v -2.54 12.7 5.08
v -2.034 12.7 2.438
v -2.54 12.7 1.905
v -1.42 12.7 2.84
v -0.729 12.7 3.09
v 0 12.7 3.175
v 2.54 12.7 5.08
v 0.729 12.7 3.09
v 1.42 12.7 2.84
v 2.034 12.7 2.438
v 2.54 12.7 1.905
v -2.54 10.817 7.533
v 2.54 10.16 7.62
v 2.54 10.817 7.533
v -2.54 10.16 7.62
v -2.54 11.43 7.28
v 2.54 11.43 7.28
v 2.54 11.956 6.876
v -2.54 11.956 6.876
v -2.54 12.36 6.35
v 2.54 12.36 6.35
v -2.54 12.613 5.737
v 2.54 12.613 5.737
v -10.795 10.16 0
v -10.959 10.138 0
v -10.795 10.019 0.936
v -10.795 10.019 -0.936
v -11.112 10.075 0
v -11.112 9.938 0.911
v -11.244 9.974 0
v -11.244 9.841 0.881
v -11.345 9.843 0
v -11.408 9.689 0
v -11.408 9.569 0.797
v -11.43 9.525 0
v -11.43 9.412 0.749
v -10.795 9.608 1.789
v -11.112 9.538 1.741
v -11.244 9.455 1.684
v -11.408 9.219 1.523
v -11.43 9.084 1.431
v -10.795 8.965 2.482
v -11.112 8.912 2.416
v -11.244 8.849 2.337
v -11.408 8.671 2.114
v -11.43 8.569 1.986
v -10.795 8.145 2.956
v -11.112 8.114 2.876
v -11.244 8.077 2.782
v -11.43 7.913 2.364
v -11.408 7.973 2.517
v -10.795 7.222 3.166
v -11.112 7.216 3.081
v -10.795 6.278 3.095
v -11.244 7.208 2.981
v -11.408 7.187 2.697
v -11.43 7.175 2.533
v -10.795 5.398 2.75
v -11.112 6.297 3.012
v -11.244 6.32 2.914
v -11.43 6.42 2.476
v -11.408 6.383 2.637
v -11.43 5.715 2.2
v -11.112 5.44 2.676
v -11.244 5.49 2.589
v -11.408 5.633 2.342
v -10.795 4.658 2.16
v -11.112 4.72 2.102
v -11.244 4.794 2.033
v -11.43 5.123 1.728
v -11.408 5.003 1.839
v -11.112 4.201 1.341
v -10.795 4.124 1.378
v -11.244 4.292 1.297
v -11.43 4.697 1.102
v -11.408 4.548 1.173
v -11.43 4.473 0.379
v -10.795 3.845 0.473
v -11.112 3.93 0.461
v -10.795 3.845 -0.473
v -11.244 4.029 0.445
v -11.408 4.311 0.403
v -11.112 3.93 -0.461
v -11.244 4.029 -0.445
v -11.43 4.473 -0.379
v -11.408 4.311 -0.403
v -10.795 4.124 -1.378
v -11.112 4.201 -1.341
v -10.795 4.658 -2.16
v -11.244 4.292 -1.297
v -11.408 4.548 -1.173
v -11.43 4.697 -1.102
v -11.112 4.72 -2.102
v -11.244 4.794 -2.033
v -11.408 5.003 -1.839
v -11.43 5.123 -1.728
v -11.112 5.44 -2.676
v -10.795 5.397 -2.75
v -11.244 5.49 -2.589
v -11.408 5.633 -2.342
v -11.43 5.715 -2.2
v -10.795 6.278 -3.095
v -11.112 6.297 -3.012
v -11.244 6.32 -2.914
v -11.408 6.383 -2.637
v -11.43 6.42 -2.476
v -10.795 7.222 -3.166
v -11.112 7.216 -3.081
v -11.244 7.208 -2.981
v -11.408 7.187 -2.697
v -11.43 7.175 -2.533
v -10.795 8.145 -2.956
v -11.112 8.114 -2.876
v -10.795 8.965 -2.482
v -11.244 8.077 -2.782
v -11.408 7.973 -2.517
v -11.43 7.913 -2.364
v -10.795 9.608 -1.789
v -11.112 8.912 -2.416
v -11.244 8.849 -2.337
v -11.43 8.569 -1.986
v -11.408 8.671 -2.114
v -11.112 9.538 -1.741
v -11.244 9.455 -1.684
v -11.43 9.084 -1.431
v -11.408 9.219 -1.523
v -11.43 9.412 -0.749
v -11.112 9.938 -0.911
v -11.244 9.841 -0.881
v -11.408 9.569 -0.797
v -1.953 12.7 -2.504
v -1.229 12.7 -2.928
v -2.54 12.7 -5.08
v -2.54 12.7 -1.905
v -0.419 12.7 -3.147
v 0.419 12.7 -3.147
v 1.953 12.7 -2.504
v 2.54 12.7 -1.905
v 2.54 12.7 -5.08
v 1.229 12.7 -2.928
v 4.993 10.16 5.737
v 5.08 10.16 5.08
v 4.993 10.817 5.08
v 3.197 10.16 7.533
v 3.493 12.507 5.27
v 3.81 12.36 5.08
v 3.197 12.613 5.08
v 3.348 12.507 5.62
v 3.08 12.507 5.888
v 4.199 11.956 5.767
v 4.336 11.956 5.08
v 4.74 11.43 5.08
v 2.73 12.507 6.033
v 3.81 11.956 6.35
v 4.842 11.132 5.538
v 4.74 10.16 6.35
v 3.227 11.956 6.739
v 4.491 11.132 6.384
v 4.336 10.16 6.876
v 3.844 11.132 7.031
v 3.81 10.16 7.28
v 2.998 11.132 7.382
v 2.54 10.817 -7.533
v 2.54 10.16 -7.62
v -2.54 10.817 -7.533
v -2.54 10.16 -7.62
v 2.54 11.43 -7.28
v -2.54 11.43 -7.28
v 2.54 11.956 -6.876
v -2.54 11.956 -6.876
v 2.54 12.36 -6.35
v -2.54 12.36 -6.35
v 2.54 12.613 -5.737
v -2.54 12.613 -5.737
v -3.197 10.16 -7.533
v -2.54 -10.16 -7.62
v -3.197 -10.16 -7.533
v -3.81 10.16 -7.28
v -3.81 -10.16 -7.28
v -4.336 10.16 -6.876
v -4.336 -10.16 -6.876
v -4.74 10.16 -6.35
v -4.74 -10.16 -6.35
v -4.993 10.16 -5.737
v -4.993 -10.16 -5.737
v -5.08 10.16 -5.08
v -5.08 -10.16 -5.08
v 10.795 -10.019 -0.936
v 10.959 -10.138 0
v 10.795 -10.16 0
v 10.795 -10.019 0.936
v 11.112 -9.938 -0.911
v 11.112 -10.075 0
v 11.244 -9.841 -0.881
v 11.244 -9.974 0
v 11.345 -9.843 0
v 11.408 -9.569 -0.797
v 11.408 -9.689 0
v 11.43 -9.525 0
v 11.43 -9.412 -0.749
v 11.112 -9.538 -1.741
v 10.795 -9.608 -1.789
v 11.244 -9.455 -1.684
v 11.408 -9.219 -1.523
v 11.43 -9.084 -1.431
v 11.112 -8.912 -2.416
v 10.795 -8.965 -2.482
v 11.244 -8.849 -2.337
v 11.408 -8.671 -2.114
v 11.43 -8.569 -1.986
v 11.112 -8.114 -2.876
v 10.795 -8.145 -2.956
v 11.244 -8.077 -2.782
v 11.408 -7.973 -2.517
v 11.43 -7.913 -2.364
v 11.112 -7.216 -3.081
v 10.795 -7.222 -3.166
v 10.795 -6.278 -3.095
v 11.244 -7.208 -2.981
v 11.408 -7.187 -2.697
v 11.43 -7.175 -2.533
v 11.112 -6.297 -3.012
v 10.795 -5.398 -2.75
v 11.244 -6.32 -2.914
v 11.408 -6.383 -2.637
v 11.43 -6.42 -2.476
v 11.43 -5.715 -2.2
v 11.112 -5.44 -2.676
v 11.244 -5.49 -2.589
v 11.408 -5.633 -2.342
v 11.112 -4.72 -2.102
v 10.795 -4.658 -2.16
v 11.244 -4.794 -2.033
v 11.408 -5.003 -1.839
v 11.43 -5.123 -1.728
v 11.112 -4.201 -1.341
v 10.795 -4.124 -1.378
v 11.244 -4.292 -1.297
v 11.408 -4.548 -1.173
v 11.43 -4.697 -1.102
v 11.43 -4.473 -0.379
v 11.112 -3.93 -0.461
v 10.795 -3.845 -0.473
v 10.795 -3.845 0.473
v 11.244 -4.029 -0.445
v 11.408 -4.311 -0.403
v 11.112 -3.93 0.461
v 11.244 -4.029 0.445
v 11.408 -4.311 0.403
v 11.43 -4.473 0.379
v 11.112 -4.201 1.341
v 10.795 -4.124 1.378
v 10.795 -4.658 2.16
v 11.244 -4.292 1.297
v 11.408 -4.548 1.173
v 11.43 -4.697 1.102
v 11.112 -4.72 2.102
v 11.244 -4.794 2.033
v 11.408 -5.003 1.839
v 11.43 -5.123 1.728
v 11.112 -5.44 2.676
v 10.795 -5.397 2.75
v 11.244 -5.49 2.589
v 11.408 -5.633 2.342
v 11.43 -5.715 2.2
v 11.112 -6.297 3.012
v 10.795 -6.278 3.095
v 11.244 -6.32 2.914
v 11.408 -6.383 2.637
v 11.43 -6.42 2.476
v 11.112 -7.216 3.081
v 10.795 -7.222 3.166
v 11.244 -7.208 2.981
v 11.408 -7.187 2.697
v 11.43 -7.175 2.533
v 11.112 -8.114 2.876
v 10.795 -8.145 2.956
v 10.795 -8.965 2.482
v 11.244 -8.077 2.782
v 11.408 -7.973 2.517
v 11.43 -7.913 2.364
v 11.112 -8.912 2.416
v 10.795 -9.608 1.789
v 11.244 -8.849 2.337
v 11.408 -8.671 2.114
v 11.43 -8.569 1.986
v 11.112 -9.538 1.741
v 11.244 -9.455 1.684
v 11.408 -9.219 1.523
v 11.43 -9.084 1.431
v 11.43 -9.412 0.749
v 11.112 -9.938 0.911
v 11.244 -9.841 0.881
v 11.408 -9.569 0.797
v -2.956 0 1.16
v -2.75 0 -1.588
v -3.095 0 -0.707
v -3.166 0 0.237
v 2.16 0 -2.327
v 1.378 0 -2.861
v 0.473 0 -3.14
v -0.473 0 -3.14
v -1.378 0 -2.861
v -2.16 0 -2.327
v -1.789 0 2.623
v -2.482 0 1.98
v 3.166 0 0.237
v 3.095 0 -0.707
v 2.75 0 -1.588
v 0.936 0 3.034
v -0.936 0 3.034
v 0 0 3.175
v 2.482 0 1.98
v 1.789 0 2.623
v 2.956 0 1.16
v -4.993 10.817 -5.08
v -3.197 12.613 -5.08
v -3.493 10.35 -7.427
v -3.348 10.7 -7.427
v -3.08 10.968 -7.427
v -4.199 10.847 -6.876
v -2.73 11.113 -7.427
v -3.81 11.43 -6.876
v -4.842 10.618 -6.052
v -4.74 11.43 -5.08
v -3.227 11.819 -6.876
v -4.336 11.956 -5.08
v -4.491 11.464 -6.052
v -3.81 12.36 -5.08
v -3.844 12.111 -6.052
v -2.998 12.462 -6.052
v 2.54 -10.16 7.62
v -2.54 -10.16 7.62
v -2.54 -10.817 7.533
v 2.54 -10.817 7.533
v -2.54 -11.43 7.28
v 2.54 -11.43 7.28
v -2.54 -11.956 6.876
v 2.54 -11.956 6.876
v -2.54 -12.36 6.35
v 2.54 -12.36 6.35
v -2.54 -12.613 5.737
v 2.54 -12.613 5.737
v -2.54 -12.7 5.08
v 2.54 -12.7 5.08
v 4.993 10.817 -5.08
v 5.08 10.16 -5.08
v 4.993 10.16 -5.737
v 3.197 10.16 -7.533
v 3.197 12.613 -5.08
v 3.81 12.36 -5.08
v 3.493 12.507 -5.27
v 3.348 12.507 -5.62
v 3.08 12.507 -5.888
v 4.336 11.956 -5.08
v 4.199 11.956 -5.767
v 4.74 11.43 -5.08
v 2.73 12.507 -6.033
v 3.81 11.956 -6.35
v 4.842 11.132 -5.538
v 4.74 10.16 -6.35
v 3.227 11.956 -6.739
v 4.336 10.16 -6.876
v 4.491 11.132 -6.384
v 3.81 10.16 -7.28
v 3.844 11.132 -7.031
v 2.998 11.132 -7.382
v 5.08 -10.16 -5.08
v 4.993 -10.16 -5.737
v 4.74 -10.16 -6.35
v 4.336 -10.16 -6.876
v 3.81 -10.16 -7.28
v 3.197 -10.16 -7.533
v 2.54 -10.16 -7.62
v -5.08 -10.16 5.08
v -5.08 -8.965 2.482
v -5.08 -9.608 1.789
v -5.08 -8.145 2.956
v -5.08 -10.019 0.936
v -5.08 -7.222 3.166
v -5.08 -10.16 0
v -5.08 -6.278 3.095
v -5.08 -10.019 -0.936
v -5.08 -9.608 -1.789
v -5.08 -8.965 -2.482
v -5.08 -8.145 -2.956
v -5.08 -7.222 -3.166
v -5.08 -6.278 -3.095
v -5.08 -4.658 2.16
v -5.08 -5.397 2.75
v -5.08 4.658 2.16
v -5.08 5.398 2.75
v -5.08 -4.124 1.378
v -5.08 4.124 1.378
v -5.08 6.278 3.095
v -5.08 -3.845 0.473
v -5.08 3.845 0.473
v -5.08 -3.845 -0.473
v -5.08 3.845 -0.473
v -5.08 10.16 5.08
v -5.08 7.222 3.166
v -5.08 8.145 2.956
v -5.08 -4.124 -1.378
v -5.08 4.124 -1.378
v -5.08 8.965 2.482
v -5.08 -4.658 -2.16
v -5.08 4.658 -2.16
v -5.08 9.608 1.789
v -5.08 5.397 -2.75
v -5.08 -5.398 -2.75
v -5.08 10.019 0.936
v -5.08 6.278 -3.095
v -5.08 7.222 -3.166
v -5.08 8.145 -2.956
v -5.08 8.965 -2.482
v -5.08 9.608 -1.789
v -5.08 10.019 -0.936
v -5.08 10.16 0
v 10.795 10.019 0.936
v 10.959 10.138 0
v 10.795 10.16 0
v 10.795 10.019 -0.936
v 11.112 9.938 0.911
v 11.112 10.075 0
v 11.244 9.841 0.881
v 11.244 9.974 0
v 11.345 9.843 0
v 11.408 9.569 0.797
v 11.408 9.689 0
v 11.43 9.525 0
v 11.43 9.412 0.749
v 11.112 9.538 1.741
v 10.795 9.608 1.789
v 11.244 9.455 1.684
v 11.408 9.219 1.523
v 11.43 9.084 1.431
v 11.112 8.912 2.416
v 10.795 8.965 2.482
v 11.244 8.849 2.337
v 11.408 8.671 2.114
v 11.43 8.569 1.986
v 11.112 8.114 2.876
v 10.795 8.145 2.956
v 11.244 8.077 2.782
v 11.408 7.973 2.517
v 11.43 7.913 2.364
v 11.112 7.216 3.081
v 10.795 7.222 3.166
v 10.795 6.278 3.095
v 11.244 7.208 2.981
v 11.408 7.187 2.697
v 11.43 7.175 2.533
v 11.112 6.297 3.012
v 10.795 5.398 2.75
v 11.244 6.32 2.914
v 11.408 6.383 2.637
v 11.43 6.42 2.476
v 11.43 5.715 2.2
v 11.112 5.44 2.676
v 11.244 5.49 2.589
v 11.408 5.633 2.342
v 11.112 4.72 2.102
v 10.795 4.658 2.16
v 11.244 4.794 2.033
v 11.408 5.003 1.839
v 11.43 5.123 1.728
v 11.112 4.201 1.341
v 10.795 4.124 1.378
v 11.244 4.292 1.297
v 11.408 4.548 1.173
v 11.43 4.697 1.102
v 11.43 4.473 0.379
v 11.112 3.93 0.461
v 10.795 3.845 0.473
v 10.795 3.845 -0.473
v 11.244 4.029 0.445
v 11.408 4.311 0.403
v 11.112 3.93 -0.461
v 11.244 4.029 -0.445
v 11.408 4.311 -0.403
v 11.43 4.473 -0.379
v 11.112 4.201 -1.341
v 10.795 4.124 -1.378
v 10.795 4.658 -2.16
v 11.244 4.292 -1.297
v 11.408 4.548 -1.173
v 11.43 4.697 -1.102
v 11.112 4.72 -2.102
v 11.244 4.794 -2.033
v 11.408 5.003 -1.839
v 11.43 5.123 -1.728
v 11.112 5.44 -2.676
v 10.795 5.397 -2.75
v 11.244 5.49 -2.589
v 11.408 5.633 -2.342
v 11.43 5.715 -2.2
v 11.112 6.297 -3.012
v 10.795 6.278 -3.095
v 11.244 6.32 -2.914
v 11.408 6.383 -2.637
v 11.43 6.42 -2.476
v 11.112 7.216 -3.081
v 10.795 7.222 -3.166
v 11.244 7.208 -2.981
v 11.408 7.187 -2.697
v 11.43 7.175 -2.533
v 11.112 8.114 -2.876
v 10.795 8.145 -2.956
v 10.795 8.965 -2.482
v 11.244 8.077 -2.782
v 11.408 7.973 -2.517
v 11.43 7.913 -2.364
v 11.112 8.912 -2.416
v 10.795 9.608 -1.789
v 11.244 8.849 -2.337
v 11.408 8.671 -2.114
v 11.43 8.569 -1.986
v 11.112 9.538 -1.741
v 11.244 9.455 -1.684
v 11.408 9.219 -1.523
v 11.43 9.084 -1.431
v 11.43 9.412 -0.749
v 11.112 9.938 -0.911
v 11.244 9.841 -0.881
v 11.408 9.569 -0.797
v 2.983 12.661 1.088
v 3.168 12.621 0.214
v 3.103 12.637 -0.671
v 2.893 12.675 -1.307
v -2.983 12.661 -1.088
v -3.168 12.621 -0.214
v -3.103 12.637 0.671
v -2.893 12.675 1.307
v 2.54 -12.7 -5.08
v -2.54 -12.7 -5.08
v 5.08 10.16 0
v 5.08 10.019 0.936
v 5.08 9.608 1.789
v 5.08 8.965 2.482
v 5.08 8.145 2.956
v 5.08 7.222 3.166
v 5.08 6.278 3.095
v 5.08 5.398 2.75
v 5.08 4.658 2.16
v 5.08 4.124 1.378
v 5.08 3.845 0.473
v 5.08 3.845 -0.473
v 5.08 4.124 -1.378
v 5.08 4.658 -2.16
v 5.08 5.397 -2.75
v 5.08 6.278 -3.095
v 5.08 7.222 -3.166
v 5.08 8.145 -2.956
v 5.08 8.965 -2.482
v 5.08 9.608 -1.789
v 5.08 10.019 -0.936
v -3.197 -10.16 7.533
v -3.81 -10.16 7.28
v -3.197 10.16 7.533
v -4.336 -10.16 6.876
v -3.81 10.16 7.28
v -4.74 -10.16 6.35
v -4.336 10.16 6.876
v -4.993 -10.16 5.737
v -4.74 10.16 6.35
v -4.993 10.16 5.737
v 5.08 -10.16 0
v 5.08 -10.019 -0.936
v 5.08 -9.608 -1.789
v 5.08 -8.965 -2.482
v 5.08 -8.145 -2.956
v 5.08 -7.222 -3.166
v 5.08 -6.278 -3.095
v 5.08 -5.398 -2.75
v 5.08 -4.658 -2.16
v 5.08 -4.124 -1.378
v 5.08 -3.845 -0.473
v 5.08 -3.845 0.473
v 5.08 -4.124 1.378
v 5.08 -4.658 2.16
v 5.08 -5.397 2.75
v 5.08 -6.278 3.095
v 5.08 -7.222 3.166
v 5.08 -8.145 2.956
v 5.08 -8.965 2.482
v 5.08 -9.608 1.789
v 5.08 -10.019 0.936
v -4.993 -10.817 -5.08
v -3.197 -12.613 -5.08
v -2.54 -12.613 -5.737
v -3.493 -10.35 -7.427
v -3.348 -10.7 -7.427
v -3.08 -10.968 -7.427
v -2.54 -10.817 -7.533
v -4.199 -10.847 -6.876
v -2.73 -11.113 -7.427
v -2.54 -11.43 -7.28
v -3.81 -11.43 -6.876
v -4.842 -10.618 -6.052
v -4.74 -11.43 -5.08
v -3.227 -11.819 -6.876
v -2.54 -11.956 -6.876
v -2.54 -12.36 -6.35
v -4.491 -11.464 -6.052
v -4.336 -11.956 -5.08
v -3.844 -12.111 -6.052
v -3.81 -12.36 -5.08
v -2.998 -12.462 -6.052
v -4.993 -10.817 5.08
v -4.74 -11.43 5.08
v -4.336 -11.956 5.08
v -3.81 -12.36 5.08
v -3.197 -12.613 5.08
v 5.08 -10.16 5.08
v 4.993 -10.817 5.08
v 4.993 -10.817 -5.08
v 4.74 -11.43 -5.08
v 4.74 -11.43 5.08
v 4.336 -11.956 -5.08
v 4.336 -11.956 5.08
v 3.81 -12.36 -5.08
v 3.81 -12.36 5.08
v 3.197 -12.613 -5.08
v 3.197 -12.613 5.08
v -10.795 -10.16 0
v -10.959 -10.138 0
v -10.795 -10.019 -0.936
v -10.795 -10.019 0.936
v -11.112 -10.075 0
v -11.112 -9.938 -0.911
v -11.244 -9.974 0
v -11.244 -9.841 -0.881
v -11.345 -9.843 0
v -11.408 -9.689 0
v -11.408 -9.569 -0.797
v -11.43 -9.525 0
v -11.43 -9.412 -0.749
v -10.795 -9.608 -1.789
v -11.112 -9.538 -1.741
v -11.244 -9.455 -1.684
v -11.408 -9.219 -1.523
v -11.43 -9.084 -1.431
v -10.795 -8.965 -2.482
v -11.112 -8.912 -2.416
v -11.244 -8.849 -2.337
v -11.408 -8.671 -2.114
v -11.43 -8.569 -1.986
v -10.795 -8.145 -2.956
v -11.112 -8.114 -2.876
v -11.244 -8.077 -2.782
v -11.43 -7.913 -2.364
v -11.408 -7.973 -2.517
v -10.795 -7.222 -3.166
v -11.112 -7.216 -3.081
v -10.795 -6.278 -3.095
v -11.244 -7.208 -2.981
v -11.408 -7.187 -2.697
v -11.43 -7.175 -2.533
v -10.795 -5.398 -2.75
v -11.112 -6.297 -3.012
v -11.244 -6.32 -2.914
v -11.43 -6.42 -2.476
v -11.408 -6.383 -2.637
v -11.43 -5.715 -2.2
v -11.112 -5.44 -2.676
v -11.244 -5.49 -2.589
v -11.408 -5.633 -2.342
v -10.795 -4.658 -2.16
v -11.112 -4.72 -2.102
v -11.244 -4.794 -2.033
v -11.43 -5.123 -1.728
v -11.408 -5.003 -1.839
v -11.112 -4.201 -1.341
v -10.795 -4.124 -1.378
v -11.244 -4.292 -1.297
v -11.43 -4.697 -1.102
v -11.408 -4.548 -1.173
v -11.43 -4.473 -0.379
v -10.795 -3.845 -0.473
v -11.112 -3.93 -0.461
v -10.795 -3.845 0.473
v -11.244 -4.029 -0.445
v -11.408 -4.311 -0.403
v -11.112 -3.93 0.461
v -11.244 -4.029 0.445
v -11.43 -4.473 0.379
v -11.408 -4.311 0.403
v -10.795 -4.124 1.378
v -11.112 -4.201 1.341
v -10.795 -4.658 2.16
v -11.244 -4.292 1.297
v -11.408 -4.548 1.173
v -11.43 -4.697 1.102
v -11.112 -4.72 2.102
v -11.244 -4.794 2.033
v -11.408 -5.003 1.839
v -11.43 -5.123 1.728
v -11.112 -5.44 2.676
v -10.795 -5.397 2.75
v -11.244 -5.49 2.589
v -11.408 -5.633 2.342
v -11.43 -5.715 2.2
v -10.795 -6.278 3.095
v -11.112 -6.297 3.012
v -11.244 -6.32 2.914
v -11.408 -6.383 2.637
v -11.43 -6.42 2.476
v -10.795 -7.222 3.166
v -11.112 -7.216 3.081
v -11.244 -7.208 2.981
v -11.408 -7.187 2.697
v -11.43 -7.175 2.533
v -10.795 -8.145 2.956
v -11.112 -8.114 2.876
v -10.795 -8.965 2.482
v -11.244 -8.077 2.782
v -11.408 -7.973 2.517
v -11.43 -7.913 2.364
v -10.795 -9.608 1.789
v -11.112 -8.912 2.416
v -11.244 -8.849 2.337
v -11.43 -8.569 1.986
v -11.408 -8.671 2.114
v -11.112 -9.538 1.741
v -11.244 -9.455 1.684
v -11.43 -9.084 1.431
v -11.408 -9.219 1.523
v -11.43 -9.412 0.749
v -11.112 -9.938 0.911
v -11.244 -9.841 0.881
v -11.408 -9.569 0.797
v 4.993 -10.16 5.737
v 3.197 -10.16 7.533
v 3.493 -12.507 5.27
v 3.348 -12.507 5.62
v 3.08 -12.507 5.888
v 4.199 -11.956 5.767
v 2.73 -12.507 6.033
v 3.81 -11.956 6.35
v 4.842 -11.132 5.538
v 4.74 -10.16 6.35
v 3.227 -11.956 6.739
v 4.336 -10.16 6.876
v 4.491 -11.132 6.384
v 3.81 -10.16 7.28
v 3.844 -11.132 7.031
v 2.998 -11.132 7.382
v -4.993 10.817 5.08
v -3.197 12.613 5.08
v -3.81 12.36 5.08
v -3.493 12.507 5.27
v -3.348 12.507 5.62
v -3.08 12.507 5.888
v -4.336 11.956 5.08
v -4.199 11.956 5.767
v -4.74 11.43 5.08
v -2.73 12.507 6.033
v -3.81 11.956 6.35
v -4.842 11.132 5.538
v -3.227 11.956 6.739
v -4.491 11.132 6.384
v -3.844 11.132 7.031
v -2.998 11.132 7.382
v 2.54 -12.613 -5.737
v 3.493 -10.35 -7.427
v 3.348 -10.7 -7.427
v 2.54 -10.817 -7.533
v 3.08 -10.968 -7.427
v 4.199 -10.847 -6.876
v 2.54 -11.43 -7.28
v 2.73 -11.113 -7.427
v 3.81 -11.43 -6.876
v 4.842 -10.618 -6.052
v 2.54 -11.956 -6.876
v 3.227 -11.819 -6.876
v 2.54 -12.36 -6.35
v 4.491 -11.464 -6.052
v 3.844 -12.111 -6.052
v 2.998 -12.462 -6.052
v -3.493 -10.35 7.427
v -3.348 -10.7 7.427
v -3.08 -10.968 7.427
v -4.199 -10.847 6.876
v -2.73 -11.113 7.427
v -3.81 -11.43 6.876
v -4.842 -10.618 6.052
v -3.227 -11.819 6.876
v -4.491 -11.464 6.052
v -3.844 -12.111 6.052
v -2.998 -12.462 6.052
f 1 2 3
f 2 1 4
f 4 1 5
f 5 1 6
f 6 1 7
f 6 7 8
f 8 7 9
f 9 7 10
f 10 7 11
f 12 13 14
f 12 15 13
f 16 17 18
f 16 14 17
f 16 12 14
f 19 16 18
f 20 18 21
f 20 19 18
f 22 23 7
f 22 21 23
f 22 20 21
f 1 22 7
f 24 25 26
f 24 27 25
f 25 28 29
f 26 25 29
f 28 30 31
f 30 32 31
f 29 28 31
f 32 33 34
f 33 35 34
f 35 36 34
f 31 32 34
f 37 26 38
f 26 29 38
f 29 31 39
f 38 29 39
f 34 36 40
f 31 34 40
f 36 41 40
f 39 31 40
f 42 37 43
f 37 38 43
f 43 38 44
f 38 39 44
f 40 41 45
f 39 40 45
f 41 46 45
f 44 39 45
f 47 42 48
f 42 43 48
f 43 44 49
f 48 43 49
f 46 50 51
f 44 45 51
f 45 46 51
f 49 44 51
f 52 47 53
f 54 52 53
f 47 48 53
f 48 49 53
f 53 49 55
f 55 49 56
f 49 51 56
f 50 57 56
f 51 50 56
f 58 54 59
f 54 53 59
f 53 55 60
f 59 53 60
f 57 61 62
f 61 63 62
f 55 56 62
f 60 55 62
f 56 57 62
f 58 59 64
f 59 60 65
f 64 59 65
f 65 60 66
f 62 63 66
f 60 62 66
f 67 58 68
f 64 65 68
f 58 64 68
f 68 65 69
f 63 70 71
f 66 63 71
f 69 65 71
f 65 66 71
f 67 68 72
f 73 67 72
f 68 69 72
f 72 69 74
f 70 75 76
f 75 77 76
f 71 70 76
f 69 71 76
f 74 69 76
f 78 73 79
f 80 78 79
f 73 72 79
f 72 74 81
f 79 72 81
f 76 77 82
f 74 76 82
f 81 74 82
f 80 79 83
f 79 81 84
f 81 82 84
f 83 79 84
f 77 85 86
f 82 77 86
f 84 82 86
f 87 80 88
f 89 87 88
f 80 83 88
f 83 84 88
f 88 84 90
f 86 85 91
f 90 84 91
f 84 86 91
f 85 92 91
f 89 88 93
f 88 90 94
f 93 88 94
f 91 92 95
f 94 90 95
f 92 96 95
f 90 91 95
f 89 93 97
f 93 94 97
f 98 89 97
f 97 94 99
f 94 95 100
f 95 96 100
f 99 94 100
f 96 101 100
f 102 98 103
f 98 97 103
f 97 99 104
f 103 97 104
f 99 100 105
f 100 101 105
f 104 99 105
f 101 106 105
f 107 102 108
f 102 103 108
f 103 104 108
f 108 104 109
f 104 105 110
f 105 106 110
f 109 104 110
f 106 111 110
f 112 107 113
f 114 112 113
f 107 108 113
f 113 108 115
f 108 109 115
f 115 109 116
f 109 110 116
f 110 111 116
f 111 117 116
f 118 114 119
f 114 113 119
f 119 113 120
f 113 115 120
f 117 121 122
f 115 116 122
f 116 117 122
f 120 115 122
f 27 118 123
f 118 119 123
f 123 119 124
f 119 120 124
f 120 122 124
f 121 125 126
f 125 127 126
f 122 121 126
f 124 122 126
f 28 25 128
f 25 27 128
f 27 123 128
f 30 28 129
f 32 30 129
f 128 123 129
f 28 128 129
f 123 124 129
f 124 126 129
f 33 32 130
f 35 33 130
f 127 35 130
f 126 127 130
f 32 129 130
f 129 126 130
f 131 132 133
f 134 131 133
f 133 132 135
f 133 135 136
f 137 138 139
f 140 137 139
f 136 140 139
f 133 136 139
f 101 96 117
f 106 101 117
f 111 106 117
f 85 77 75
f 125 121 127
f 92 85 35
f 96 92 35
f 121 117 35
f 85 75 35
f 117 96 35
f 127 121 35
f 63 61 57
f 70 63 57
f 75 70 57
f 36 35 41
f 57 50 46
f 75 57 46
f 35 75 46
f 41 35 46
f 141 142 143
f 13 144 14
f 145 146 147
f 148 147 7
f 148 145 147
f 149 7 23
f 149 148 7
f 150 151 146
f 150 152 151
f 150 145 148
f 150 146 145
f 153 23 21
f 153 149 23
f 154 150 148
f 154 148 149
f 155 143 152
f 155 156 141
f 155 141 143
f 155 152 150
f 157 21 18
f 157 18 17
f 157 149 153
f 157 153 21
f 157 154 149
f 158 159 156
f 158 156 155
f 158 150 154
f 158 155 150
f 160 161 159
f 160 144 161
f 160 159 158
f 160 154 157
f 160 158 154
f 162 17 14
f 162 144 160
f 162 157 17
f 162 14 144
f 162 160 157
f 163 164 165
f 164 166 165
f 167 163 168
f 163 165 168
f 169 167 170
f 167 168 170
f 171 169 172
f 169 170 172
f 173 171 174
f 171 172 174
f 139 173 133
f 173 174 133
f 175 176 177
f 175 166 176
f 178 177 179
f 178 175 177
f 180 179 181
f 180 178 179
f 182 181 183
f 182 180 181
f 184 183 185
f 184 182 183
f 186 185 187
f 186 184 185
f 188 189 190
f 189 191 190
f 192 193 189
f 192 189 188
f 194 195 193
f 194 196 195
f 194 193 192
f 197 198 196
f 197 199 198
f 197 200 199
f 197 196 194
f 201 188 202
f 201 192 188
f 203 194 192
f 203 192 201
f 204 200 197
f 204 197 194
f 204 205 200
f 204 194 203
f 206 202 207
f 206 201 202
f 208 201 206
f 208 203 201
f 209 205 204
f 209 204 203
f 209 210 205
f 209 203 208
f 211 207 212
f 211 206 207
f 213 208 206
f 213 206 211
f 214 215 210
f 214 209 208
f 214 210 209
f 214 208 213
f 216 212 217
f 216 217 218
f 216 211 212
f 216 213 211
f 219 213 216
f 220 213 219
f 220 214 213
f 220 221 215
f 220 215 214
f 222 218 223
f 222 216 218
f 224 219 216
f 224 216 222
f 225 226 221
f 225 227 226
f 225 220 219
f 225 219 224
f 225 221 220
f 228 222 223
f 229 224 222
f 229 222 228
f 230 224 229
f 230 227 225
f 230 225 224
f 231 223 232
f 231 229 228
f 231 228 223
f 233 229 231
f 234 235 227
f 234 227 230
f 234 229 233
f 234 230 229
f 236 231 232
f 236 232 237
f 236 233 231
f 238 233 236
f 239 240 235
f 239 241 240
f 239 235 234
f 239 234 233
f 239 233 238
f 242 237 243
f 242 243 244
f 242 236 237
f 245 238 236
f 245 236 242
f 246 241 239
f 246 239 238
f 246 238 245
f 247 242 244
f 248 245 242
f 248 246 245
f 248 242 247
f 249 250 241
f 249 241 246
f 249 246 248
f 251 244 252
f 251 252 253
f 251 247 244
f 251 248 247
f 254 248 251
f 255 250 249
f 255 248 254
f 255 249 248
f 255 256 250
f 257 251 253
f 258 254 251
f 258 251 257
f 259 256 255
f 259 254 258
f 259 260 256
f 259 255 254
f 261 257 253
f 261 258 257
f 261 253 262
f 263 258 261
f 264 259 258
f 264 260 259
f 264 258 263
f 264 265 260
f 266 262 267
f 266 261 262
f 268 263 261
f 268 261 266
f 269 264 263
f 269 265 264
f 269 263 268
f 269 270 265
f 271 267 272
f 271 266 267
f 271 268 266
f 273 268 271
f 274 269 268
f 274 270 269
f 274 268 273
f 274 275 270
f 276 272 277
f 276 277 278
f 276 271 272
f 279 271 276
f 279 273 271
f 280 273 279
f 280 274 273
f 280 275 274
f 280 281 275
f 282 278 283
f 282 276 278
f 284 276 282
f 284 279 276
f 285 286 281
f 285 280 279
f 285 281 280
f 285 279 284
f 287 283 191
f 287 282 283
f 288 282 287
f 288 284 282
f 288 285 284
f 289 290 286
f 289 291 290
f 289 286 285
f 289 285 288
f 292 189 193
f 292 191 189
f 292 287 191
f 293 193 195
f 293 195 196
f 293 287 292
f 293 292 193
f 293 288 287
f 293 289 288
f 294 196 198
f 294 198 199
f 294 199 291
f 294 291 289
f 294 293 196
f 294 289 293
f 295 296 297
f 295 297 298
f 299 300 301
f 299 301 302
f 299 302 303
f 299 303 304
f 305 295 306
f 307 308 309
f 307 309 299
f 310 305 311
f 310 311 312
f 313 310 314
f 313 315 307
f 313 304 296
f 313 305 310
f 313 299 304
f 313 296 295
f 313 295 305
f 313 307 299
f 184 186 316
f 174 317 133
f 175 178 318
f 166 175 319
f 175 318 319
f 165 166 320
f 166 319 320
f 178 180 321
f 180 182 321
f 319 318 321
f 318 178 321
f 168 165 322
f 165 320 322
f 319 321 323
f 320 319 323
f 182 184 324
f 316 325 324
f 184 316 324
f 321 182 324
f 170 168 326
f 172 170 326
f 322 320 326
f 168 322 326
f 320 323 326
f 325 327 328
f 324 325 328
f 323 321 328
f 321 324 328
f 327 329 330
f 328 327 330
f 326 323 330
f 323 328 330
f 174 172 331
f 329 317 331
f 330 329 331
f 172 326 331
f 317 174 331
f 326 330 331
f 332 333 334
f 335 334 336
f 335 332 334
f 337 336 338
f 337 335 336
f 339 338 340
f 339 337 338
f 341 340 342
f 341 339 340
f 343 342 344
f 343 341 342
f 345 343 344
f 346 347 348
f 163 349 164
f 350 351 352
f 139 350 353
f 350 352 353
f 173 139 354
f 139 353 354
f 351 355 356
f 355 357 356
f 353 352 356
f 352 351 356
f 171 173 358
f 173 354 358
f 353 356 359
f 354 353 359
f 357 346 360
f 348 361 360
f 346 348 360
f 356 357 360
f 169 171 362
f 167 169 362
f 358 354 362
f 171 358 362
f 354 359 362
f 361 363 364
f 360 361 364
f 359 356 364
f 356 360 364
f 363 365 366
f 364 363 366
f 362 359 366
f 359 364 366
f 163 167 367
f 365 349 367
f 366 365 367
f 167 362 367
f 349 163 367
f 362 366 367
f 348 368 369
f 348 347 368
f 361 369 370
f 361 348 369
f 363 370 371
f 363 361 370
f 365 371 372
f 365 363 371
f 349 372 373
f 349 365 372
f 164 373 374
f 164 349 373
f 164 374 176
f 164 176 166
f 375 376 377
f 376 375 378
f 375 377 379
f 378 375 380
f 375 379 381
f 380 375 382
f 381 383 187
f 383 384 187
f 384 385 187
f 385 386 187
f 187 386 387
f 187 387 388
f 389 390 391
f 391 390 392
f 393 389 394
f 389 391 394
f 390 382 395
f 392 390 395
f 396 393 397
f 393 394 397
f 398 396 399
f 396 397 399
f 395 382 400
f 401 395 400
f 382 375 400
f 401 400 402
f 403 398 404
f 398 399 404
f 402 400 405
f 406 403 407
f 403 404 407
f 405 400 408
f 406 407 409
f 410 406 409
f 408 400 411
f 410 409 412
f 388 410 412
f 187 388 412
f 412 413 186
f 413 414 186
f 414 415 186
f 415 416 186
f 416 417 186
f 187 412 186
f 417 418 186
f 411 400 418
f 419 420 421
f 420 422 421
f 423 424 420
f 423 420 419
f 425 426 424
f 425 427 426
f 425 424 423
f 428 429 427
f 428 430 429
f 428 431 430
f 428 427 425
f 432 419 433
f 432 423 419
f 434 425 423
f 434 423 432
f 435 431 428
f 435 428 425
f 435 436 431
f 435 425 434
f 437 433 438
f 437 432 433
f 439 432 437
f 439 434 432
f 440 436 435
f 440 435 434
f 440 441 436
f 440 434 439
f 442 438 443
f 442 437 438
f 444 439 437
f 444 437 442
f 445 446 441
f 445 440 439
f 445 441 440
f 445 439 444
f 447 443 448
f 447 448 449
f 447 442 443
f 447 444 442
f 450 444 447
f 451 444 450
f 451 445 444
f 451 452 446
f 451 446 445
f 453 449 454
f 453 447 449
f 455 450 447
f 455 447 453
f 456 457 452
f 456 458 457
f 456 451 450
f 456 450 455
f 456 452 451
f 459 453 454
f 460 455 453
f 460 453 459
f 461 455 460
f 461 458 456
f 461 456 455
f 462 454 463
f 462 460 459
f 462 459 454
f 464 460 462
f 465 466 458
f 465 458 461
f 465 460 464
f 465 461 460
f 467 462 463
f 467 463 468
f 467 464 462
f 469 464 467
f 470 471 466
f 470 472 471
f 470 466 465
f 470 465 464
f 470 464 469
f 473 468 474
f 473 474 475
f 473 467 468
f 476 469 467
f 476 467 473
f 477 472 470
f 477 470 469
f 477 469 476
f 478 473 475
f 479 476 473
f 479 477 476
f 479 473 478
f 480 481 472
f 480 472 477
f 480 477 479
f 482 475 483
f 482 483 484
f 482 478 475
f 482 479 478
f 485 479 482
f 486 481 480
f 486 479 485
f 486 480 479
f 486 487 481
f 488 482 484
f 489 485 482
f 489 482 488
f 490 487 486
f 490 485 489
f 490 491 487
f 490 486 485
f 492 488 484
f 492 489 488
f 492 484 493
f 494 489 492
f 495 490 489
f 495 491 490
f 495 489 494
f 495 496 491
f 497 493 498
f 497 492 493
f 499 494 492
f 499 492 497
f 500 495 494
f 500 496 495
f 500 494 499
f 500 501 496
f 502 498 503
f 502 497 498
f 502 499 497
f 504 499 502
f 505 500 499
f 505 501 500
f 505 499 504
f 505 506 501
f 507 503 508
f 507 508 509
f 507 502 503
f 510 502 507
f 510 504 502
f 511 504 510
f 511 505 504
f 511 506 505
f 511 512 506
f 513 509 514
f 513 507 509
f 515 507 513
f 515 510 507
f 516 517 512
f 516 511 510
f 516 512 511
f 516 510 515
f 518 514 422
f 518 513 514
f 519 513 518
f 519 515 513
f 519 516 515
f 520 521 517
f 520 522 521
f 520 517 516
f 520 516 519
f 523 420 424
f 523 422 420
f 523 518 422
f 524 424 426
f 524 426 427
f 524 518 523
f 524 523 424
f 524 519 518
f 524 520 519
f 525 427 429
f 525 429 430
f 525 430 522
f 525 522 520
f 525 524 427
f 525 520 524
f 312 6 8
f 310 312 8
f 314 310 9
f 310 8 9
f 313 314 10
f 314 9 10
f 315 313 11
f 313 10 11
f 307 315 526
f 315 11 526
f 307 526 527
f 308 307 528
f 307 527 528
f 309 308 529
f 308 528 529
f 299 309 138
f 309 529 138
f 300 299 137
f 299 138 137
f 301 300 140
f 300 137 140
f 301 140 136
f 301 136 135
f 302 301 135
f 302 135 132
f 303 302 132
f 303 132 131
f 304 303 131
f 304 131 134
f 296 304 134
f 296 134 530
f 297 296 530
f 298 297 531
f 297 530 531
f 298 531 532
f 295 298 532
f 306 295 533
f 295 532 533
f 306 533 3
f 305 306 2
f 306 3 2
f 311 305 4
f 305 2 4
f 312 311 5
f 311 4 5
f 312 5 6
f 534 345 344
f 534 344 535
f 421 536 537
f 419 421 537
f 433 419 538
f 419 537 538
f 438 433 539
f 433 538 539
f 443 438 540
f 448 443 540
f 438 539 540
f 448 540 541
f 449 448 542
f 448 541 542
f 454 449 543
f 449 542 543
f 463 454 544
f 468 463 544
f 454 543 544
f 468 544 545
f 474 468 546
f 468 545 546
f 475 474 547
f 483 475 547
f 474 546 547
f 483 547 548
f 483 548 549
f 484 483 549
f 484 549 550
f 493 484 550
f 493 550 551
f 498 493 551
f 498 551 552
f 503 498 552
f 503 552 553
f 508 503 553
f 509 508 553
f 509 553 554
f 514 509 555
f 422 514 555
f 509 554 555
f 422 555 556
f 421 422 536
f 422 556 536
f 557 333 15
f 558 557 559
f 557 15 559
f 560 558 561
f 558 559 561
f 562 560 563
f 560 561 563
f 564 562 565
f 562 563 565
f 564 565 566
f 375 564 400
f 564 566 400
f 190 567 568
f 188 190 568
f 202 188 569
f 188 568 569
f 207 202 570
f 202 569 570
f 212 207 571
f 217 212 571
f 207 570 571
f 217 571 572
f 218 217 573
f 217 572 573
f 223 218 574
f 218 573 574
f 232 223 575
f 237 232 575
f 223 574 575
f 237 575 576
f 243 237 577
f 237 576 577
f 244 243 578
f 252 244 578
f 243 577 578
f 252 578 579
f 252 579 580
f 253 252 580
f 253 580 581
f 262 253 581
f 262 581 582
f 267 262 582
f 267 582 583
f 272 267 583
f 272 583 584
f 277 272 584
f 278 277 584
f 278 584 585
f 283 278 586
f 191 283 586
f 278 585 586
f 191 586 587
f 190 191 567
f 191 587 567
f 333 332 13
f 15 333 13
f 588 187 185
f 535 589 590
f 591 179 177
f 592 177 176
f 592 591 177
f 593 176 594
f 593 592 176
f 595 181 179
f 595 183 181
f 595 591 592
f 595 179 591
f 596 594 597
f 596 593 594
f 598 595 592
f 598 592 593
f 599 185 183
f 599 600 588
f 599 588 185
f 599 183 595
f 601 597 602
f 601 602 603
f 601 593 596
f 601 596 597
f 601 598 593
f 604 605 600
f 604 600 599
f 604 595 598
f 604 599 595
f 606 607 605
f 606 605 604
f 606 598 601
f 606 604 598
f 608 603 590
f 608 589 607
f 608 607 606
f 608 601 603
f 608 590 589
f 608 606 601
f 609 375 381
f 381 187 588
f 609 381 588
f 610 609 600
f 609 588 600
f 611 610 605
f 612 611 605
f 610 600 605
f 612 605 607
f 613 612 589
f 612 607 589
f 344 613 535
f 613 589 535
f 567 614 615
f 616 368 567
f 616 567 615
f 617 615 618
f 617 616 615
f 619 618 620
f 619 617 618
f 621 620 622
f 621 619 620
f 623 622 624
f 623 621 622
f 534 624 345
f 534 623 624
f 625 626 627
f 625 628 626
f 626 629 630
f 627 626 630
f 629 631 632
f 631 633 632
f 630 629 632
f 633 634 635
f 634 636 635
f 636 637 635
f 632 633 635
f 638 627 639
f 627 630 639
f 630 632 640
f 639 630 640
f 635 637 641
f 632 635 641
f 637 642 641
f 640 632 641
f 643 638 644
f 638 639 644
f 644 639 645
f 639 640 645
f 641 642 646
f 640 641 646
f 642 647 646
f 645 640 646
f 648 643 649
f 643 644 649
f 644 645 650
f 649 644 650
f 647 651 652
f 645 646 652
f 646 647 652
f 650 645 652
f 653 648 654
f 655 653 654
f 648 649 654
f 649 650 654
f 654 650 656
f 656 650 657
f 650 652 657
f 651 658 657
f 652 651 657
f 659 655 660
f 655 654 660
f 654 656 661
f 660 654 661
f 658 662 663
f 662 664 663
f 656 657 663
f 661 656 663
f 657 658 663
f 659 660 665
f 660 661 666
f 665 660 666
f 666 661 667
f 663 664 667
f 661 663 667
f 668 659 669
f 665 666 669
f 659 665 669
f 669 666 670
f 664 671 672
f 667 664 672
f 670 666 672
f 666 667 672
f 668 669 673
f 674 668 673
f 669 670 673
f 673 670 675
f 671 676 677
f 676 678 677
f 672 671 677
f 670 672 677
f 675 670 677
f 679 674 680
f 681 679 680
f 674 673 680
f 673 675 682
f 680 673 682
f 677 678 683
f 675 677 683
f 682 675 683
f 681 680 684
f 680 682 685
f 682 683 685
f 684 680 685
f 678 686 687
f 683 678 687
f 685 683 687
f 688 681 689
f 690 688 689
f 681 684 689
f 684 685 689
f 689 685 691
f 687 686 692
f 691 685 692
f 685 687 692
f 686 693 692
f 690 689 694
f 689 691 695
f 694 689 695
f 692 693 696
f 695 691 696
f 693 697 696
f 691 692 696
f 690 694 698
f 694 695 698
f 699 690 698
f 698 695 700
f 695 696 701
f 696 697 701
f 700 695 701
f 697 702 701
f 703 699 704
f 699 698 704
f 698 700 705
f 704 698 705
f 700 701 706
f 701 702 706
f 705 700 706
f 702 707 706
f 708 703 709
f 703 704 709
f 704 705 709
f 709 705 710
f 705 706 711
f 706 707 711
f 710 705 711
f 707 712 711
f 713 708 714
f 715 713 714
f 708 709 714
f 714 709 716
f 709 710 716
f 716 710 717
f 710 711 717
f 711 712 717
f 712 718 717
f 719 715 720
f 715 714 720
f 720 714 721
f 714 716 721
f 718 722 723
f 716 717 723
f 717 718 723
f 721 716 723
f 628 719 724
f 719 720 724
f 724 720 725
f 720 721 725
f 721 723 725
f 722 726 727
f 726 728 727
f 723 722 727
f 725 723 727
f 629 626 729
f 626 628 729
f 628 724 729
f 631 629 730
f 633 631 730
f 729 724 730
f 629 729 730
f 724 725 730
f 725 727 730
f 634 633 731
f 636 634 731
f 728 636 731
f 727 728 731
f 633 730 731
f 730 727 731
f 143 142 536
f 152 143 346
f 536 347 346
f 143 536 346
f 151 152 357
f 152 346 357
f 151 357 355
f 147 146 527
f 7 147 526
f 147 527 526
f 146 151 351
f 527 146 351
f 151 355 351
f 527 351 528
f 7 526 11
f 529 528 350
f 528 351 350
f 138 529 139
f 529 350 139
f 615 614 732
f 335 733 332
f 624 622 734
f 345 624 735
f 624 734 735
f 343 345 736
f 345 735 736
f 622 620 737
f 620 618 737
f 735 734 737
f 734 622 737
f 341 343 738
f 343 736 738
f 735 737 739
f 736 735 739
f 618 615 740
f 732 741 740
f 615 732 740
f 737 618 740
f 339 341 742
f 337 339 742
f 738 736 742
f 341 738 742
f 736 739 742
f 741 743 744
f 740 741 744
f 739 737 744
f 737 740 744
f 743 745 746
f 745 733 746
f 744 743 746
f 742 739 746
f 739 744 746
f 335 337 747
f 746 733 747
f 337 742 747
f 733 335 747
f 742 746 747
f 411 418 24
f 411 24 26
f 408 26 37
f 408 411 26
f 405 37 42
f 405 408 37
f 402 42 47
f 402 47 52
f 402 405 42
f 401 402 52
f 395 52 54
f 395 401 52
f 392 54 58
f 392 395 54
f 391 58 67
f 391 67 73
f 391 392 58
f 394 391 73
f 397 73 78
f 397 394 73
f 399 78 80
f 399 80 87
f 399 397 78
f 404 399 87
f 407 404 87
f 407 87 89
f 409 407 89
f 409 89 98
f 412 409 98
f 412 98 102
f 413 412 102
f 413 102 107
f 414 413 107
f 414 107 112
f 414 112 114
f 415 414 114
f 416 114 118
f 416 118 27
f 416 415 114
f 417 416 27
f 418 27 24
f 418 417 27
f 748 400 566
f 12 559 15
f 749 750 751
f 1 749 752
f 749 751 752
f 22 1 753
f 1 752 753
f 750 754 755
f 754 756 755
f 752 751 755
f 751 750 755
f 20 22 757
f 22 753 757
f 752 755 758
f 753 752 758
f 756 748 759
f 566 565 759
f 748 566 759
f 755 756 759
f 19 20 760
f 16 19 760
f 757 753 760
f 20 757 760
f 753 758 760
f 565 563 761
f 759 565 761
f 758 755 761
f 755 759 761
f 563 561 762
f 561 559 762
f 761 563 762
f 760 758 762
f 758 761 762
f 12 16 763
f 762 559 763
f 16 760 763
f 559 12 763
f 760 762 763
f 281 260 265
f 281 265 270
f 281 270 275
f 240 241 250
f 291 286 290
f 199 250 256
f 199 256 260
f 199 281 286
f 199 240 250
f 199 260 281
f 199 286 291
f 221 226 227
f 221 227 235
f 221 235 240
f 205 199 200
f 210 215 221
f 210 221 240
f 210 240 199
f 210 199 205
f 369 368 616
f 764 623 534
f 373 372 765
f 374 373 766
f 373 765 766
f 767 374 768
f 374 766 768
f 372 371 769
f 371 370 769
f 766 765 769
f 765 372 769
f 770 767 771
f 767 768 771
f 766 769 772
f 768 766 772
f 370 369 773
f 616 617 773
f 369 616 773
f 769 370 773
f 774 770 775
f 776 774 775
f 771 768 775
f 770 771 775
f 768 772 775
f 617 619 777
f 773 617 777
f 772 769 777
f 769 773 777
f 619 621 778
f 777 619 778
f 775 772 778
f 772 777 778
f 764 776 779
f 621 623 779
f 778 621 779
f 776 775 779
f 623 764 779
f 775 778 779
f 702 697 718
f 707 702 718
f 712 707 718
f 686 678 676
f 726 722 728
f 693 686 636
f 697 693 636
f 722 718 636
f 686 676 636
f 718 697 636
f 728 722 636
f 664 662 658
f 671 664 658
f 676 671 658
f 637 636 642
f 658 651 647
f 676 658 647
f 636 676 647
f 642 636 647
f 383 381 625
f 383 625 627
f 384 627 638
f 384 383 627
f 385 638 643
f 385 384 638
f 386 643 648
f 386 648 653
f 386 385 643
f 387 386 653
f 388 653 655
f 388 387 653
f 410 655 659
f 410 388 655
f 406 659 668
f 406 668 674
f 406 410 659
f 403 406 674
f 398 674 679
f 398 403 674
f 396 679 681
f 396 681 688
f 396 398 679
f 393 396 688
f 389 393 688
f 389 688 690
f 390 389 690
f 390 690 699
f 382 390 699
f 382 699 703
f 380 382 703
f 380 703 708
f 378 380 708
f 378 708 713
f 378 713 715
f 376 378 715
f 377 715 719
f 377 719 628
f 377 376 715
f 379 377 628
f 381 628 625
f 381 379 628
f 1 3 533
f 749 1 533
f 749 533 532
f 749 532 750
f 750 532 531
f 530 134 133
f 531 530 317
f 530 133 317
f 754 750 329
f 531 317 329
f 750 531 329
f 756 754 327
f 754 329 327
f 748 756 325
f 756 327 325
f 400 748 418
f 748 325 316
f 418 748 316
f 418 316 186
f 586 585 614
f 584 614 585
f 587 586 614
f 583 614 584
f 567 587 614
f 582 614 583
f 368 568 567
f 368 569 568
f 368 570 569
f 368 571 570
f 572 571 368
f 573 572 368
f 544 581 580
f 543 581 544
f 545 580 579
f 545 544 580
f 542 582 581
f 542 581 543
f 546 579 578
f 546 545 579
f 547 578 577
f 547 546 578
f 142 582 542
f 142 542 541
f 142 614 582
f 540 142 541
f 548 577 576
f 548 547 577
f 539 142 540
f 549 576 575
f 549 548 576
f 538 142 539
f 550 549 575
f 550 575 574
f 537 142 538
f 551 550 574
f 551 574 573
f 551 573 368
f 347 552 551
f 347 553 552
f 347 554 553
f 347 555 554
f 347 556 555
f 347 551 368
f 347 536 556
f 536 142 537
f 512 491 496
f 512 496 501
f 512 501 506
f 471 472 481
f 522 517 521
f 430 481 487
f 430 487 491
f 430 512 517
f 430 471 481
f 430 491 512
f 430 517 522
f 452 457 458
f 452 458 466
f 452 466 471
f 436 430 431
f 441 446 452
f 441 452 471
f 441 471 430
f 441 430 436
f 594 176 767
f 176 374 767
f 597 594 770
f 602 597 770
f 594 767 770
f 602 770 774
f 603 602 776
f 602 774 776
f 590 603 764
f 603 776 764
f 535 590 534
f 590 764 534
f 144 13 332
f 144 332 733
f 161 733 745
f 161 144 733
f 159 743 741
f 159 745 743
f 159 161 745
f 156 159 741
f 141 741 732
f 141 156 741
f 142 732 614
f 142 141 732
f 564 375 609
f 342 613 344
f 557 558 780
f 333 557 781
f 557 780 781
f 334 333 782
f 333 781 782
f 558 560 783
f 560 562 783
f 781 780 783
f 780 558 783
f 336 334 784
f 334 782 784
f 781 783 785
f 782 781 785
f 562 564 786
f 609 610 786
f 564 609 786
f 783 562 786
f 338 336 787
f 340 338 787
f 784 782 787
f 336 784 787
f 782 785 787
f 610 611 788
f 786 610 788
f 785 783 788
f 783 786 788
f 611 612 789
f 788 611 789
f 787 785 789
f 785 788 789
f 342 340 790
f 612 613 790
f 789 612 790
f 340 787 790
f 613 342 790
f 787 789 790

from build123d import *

# Parameters (mm, degrees)
SKETCH1_W           = 15.24
SKETCH1_H           = 25.4
BOSS_EXTRUDE1_DEPTH = 5.08
FILLET1_R           = 2.54
SKETCH2_R           = 3.175
BOSS_EXTRUDE2_DEPTH = 6.35
SKETCH3_W           = 5.08
SKETCH3_H           = 10.16
BOSS_EXTRUDE3_DEPTH = 5.08
SKETCH4_W           = 7.62
SKETCH4_H           = 12.7
BOSS_EXTRUDE4_DEPTH = 25.4
FILLET2_R           = 2.54
FILLET3_R           = 3.81
SKETCH5_R           = 1.905
BOSS_EXTRUDE5_DEPTH = 1.27
BOSS_EXTRUDE6_DEPTH = 25.4
FILLET4_R           = 1.27
SKETCH7_W           = 5.588
SKETCH7_H           = 21.59
CUT_EXTRUDE1_DEPTH  = 1.016
FILLET5_R           = 0.254
CUT_EXTRUDE2_REACH  = 52.512
SKETCH8_R           = 4.445
FILLET6_R           = 0.635
SKETCH9_W           = 25.4
SKETCH9_H           = 50.8
CUT_EXTRUDE3_DEPTH  = 22.86
SKETCH10_R          = 3.175
CUT_EXTRUDE4_DEPTH  = 12.7


# Some blends are built 0.0001 mm under size
with BuildPart() as part:
    # Sketch1 → Boss-Extrude1 (new, symmetric)
    with BuildSketch(Plane(origin=(0, 0, 0), x_dir=(0, 0, -1), z_dir=(1, 0, 0))):
        Rectangle(SKETCH1_W, SKETCH1_H)
    extrude(amount=BOSS_EXTRUDE1_DEPTH, both=True)

    # Fillet1
    fillet1_edges = [part.edges().sort_by_distance(p)[0] for p in [
        (5.08, 0, 7.62),
        (5.08, -12.7, 0),
        (5.08, 0, -7.62),
        (-5.08, -12.7, 0),
        (-5.08, 0, 7.62),
        (-5.08, 12.7, 0),
        (-5.08, 0, -7.62),
        (5.08, 12.7, 0),
        (0, -12.7, -7.62),
        (0, -12.7, 7.62),
        (0, 12.7, 7.62),
        (0, 12.7, -7.62),
    ]]
    fillet(fillet1_edges, radius=FILLET1_R)

    # Sketch2 → Boss-Extrude2 (add)
    with BuildSketch(Plane(origin=(5.08, 0, 0), x_dir=(0, 0, -1), z_dir=(1, 0, 0))):
        with Locations(Location((0, 6.985, 0), (0, 0, 90))):
            Circle(SKETCH2_R)
        with Locations(Location((0, -6.985, 0), (0, 0, 270))):
            Circle(SKETCH2_R)
    boss_extrude2 = extrude(amount=BOSS_EXTRUDE2_DEPTH)

    # Mirror1: Boss-Extrude2 across plane
    add(boss_extrude2.mirror(Plane(origin=(0, 0, 0), x_dir=(0, 0, 1), z_dir=(1, 0, 0))))

    # Sketch3 → Boss-Extrude3 (add)
    with BuildSketch(Plane(origin=(0, 12.7, 0), x_dir=(1, 0, 0), z_dir=(0, 1, 0))):
        Rectangle(SKETCH3_W, SKETCH3_H)
    extrude(amount=BOSS_EXTRUDE3_DEPTH)

    # Sketch4 → Boss-Extrude4 (add)
    with BuildSketch(Plane(origin=(0, 17.78, 0), x_dir=(1, 0, 0), z_dir=(0, 1, 0))):
        Rectangle(SKETCH4_W, SKETCH4_H)
    extrude(amount=BOSS_EXTRUDE4_DEPTH)

    # Fillet2
    # the kernel refuses this fillet: 2.54 mm, written as the material it takes off along each edge
    with BuildSketch(Plane(origin=(10.16, 17.78, -6.35), x_dir=(0, 0, 1), z_dir=(-1, 0, 0))) as fillet2_piece_1_section:
        with BuildLine():
            CenterArc((FILLET2_R, FILLET2_R), FILLET2_R, 180, 90)
            Line((0, FILLET2_R), (0, 0))
            Line((0, 0), (FILLET2_R, 0))
        make_face()
    fillet2_piece_1 = extrude(amount=20.32, mode=Mode.PRIVATE)
    fillet2_piece_1 = split(fillet2_piece_1, bisect_by=Plane(origin=(6.35, 17.840981289, -5.08), z_dir=(0, 0, 1)), keep=Keep.TOP, mode=Mode.PRIVATE)
    fillet2_piece_1 = split(fillet2_piece_1, bisect_by=Plane(origin=(2.54, 17.840981289, -4.665343007), z_dir=(1, 0, 0)), keep=Keep.TOP, mode=Mode.PRIVATE)
    add(fillet2_piece_1, mode=Mode.SUBTRACT)
    with BuildSketch(Plane(origin=(10.16, 17.78, -6.35), x_dir=(0, 0, 1), z_dir=(-1, 0, 0))) as fillet2_piece_2_section:
        with BuildLine():
            CenterArc((FILLET2_R, FILLET2_R), FILLET2_R, 180, 90)
            Line((0, FILLET2_R), (0, 0))
            Line((0, 0), (FILLET2_R, 0))
        make_face()
    fillet2_piece_2 = extrude(amount=20.32, mode=Mode.PRIVATE)
    fillet2_piece_2 = split(fillet2_piece_2, bisect_by=Plane(origin=(6.35, 18.428004952, -5.08), z_dir=(0, 0, -1)), keep=Keep.TOP, mode=Mode.PRIVATE)
    fillet2_piece_2 = split(fillet2_piece_2, bisect_by=Plane(origin=(2.54, 18.428004952, -5.932444919), z_dir=(1, 0, 0)), keep=Keep.TOP, mode=Mode.PRIVATE)
    add(fillet2_piece_2, mode=Mode.SUBTRACT)
    with BuildSketch(Plane(origin=(10.16, 17.78, -6.35), x_dir=(0, 0, 1), z_dir=(-1, 0, 0))) as fillet2_piece_3_section:
        with BuildLine():
            CenterArc((FILLET2_R, FILLET2_R), FILLET2_R, 180, 90)
            Line((0, FILLET2_R), (0, 0))
            Line((0, 0), (FILLET2_R, 0))
        make_face()
    fillet2_piece_3 = extrude(amount=20.32, mode=Mode.PRIVATE)
    fillet2_piece_3 = split(fillet2_piece_3, bisect_by=Plane(origin=(0, 18.428004952, -5.08), z_dir=(0, 0, -1)), keep=Keep.TOP, mode=Mode.PRIVATE)
    fillet2_piece_3 = split(fillet2_piece_3, bisect_by=Plane(origin=(-2.54, 18.428004952, -5.932444919), z_dir=(1, 0, 0)), keep=Keep.TOP, mode=Mode.PRIVATE)
    fillet2_piece_3 = split(fillet2_piece_3, bisect_by=Plane(origin=(2.54, 18.428004952, -5.932444919), z_dir=(-1, 0, 0)), keep=Keep.TOP, mode=Mode.PRIVATE)
    add(fillet2_piece_3, mode=Mode.SUBTRACT)
    with BuildSketch(Plane(origin=(10.16, 17.78, -6.35), x_dir=(0, 0, 1), z_dir=(-1, 0, 0))) as fillet2_piece_4_section:
        with BuildLine():
            CenterArc((FILLET2_R, FILLET2_R), FILLET2_R, 180, 90)
            Line((0, FILLET2_R), (0, 0))
            Line((0, 0), (FILLET2_R, 0))
        make_face()
    fillet2_piece_4 = extrude(amount=20.32, mode=Mode.PRIVATE)
    fillet2_piece_4 = split(fillet2_piece_4, bisect_by=Plane(origin=(-6.35, 17.840981289, -5.08), z_dir=(0, 0, 1)), keep=Keep.TOP, mode=Mode.PRIVATE)
    fillet2_piece_4 = split(fillet2_piece_4, bisect_by=Plane(origin=(-2.54, 17.840981289, -4.665343007), z_dir=(-1, 0, 0)), keep=Keep.TOP, mode=Mode.PRIVATE)
    add(fillet2_piece_4, mode=Mode.SUBTRACT)
    with BuildSketch(Plane(origin=(10.16, 17.78, -6.35), x_dir=(0, 0, 1), z_dir=(-1, 0, 0))) as fillet2_piece_5_section:
        with BuildLine():
            CenterArc((FILLET2_R, FILLET2_R), FILLET2_R, 180, 90)
            Line((0, FILLET2_R), (0, 0))
            Line((0, 0), (FILLET2_R, 0))
        make_face()
    fillet2_piece_5 = extrude(amount=20.32, mode=Mode.PRIVATE)
    fillet2_piece_5 = split(fillet2_piece_5, bisect_by=Plane(origin=(-6.35, 18.428004952, -5.08), z_dir=(0, 0, -1)), keep=Keep.TOP, mode=Mode.PRIVATE)
    fillet2_piece_5 = split(fillet2_piece_5, bisect_by=Plane(origin=(-2.54, 18.428004952, -5.932444919), z_dir=(-1, 0, 0)), keep=Keep.TOP, mode=Mode.PRIVATE)
    add(fillet2_piece_5, mode=Mode.SUBTRACT)
    with BuildSketch(Plane(origin=(-10.16, 17.78, 6.35), x_dir=(0, 1, 0), z_dir=(1, 0, 0))) as fillet2_piece_6_section:
        with BuildLine():
            CenterArc((FILLET2_R, -FILLET2_R), FILLET2_R, 90, 90)
            Line((0, -FILLET2_R), (0, 0))
            Line((0, 0), (FILLET2_R, 0))
        make_face()
    fillet2_piece_6 = extrude(amount=20.32, mode=Mode.PRIVATE)
    fillet2_piece_6 = split(fillet2_piece_6, bisect_by=Plane(origin=(-2.54, 18.428004952, 5.932444919), z_dir=(-1, 0, 0)), keep=Keep.TOP, mode=Mode.PRIVATE)
    fillet2_piece_6 = split(fillet2_piece_6, bisect_by=Plane(origin=(-6.35, 18.428004952, 5.08), z_dir=(0, 0, 1)), keep=Keep.TOP, mode=Mode.PRIVATE)
    add(fillet2_piece_6, mode=Mode.SUBTRACT)
    with BuildSketch(Plane(origin=(-10.16, 17.78, 6.35), x_dir=(0, 1, 0), z_dir=(1, 0, 0))) as fillet2_piece_7_section:
        with BuildLine():
            CenterArc((FILLET2_R, -FILLET2_R), FILLET2_R, 90, 90)
            Line((0, -FILLET2_R), (0, 0))
            Line((0, 0), (FILLET2_R, 0))
        make_face()
    fillet2_piece_7 = extrude(amount=20.32, mode=Mode.PRIVATE)
    fillet2_piece_7 = split(fillet2_piece_7, bisect_by=Plane(origin=(-2.54, 17.840981289, 4.665343007), z_dir=(-1, 0, 0)), keep=Keep.TOP, mode=Mode.PRIVATE)
    fillet2_piece_7 = split(fillet2_piece_7, bisect_by=Plane(origin=(-6.35, 17.840981289, 5.08), z_dir=(0, 0, -1)), keep=Keep.TOP, mode=Mode.PRIVATE)
    add(fillet2_piece_7, mode=Mode.SUBTRACT)
    with BuildSketch(Plane(origin=(-10.16, 17.78, 6.35), x_dir=(0, 1, 0), z_dir=(1, 0, 0))) as fillet2_piece_8_section:
        with BuildLine():
            CenterArc((FILLET2_R, -FILLET2_R), FILLET2_R, 90, 90)
            Line((0, -FILLET2_R), (0, 0))
            Line((0, 0), (FILLET2_R, 0))
        make_face()
    fillet2_piece_8 = extrude(amount=20.32, mode=Mode.PRIVATE)
    fillet2_piece_8 = split(fillet2_piece_8, bisect_by=Plane(origin=(-2.54, 18.428004952, 5.932444919), z_dir=(1, 0, 0)), keep=Keep.TOP, mode=Mode.PRIVATE)
    fillet2_piece_8 = split(fillet2_piece_8, bisect_by=Plane(origin=(0, 18.428004952, 5.08), z_dir=(0, 0, 1)), keep=Keep.TOP, mode=Mode.PRIVATE)
    fillet2_piece_8 = split(fillet2_piece_8, bisect_by=Plane(origin=(2.54, 18.428004952, 5.932444919), z_dir=(-1, 0, 0)), keep=Keep.TOP, mode=Mode.PRIVATE)
    add(fillet2_piece_8, mode=Mode.SUBTRACT)
    with BuildSketch(Plane(origin=(-10.16, 17.78, 6.35), x_dir=(0, 1, 0), z_dir=(1, 0, 0))) as fillet2_piece_9_section:
        with BuildLine():
            CenterArc((FILLET2_R, -FILLET2_R), FILLET2_R, 90, 90)
            Line((0, -FILLET2_R), (0, 0))
            Line((0, 0), (FILLET2_R, 0))
        make_face()
    fillet2_piece_9 = extrude(amount=20.32, mode=Mode.PRIVATE)
    fillet2_piece_9 = split(fillet2_piece_9, bisect_by=Plane(origin=(6.35, 18.428004952, 5.08), z_dir=(0, 0, 1)), keep=Keep.TOP, mode=Mode.PRIVATE)
    fillet2_piece_9 = split(fillet2_piece_9, bisect_by=Plane(origin=(2.54, 18.428004952, 5.932444919), z_dir=(1, 0, 0)), keep=Keep.TOP, mode=Mode.PRIVATE)
    add(fillet2_piece_9, mode=Mode.SUBTRACT)
    with BuildSketch(Plane(origin=(-10.16, 17.78, 6.35), x_dir=(0, 1, 0), z_dir=(1, 0, 0))) as fillet2_piece_10_section:
        with BuildLine():
            CenterArc((FILLET2_R, -FILLET2_R), FILLET2_R, 90, 90)
            Line((0, -FILLET2_R), (0, 0))
            Line((0, 0), (FILLET2_R, 0))
        make_face()
    fillet2_piece_10 = extrude(amount=20.32, mode=Mode.PRIVATE)
    fillet2_piece_10 = split(fillet2_piece_10, bisect_by=Plane(origin=(6.35, 17.840981289, 5.08), z_dir=(0, 0, -1)), keep=Keep.TOP, mode=Mode.PRIVATE)
    fillet2_piece_10 = split(fillet2_piece_10, bisect_by=Plane(origin=(2.54, 17.840981289, 4.665343007), z_dir=(1, 0, 0)), keep=Keep.TOP, mode=Mode.PRIVATE)
    add(fillet2_piece_10, mode=Mode.SUBTRACT)

    # Fillet3
    fillet3_edges = [part.edges().sort_by_distance(p)[0] for p in [
        (3.81, 43.18, 0),
        (0, 43.18, -6.35),
        (-3.81, 43.18, 0),
        (0, 43.18, 6.35),
    ]]
    fillet(fillet3_edges, radius=FILLET3_R - 0.0001)  # a hair under: the kernel refuses the full size

    # Sketch5 → Boss-Extrude5 (add)
    with BuildSketch(Plane(origin=(0, 0, -6.35), x_dir=(-1, 0, 0), z_dir=(0, 0, -1))):
        with Locations(Location((0, 32.385, 0), (0, 0, 180))):
            Circle(SKETCH5_R)
        with Locations(Location((0, 25.4, 0), (0, 0, 180))):
            Circle(SKETCH5_R)
    extrude(amount=BOSS_EXTRUDE5_DEPTH)

    # Sketch6 → Boss-Extrude6 (add)
    with BuildSketch(Plane(origin=(0, 21.59, 0), x_dir=(1, 0, 0), z_dir=(0, 1, 0))):
        with BuildLine():
            Line((-3.81, 10.541), (3.81, 10.541))
            ThreePointArc((3.81, 10.541), (5.588, 8.763), (3.81, 6.985))
            Line((3.81, 6.985), (-3.81, 6.985))
            ThreePointArc((-3.81, 6.985), (-5.588, 8.763), (-3.81, 10.541))
        make_face()
    extrude(amount=BOSS_EXTRUDE6_DEPTH)

    # Fillet4
    fillet4_edges = [part.edges().sort_by_distance(p)[0] for p in [
        (0, 21.59, -6.985),
        (-5.588, 21.59, -8.763),
        (5.588, 21.59, -8.763),
        (0, 21.59, -10.541),
        (-5.588, 46.99, -8.763),
        (0, 46.99, -6.985),
        (5.588, 46.99, -8.763),
        (0, 46.99, -10.541),
    ]]
    fillet(fillet4_edges, radius=FILLET4_R)

    # Sketch7 → Cut-Extrude1 (cut)
    with BuildSketch(Plane(origin=(0, 0, -10.541), x_dir=(-1, 0, 0), z_dir=(0, 0, -1))):
        with Locations((0, 34.29)):
            Rectangle(SKETCH7_W, SKETCH7_H)
    extrude(amount=-CUT_EXTRUDE1_DEPTH, mode=Mode.SUBTRACT)

    # Fillet5
    fillet5_edges = [part.edges().sort_by_distance(p)[0] for p in [
        (-2.794, 34.29, -10.541),
        (0, 45.085, -10.541),
        (2.794, 34.29, -10.541),
        (0, 23.495, -10.541),
    ]]
    fillet(fillet5_edges, radius=FILLET5_R)

    # Sketch8 → Cut-Extrude2 (cut, up to next)
    with BuildSketch(Plane(origin=(3.81, 0, 0), x_dir=(0, 0, -1), z_dir=(1, 0, 0)), mode=Mode.PRIVATE) as cut_extrude2_sk1:
        with Locations((0, 33.02)):
            Circle(SKETCH8_R)
    cut_extrude2_tool1 = extrude(cut_extrude2_sk1.sketch, amount=-CUT_EXTRUDE2_REACH, mode=Mode.PRIVATE) & part.part
    add(cut_extrude2_tool1.solids().sort_by_distance((3.81, 33.02, 0))[0], mode=Mode.SUBTRACT)

    # Fillet6
    fillet6_edges = [part.edges().sort_by_distance(p)[0] for p in [
        (11.43, 3.81, 0),
        (11.43, -3.81, 0),
        (-11.43, 3.81, 0),
        (-11.43, -3.81, 0),
    ]]
    fillet(fillet6_edges, radius=FILLET6_R)

    # Sketch9 → Cut-Extrude3 (cut)
    with BuildSketch(Plane(origin=(11.43, 0, 0), x_dir=(0, 0, -1), z_dir=(1, 0, 0))):
        with Locations((0, 38.1)):
            Rectangle(SKETCH9_W, SKETCH9_H)
    extrude(amount=-CUT_EXTRUDE3_DEPTH, mode=Mode.SUBTRACT)

    # Sketch10 → Cut-Extrude4 (cut)
    with BuildSketch(Plane(origin=(0, 12.7, 0), x_dir=(1, 0, 0), z_dir=(0, 1, 0))):
        with Locations(Location((0, 0, 0), (0, 0, 270))):
            Circle(SKETCH10_R)
    extrude(amount=-CUT_EXTRUDE4_DEPTH, mode=Mode.SUBTRACT)


solid = part.part
